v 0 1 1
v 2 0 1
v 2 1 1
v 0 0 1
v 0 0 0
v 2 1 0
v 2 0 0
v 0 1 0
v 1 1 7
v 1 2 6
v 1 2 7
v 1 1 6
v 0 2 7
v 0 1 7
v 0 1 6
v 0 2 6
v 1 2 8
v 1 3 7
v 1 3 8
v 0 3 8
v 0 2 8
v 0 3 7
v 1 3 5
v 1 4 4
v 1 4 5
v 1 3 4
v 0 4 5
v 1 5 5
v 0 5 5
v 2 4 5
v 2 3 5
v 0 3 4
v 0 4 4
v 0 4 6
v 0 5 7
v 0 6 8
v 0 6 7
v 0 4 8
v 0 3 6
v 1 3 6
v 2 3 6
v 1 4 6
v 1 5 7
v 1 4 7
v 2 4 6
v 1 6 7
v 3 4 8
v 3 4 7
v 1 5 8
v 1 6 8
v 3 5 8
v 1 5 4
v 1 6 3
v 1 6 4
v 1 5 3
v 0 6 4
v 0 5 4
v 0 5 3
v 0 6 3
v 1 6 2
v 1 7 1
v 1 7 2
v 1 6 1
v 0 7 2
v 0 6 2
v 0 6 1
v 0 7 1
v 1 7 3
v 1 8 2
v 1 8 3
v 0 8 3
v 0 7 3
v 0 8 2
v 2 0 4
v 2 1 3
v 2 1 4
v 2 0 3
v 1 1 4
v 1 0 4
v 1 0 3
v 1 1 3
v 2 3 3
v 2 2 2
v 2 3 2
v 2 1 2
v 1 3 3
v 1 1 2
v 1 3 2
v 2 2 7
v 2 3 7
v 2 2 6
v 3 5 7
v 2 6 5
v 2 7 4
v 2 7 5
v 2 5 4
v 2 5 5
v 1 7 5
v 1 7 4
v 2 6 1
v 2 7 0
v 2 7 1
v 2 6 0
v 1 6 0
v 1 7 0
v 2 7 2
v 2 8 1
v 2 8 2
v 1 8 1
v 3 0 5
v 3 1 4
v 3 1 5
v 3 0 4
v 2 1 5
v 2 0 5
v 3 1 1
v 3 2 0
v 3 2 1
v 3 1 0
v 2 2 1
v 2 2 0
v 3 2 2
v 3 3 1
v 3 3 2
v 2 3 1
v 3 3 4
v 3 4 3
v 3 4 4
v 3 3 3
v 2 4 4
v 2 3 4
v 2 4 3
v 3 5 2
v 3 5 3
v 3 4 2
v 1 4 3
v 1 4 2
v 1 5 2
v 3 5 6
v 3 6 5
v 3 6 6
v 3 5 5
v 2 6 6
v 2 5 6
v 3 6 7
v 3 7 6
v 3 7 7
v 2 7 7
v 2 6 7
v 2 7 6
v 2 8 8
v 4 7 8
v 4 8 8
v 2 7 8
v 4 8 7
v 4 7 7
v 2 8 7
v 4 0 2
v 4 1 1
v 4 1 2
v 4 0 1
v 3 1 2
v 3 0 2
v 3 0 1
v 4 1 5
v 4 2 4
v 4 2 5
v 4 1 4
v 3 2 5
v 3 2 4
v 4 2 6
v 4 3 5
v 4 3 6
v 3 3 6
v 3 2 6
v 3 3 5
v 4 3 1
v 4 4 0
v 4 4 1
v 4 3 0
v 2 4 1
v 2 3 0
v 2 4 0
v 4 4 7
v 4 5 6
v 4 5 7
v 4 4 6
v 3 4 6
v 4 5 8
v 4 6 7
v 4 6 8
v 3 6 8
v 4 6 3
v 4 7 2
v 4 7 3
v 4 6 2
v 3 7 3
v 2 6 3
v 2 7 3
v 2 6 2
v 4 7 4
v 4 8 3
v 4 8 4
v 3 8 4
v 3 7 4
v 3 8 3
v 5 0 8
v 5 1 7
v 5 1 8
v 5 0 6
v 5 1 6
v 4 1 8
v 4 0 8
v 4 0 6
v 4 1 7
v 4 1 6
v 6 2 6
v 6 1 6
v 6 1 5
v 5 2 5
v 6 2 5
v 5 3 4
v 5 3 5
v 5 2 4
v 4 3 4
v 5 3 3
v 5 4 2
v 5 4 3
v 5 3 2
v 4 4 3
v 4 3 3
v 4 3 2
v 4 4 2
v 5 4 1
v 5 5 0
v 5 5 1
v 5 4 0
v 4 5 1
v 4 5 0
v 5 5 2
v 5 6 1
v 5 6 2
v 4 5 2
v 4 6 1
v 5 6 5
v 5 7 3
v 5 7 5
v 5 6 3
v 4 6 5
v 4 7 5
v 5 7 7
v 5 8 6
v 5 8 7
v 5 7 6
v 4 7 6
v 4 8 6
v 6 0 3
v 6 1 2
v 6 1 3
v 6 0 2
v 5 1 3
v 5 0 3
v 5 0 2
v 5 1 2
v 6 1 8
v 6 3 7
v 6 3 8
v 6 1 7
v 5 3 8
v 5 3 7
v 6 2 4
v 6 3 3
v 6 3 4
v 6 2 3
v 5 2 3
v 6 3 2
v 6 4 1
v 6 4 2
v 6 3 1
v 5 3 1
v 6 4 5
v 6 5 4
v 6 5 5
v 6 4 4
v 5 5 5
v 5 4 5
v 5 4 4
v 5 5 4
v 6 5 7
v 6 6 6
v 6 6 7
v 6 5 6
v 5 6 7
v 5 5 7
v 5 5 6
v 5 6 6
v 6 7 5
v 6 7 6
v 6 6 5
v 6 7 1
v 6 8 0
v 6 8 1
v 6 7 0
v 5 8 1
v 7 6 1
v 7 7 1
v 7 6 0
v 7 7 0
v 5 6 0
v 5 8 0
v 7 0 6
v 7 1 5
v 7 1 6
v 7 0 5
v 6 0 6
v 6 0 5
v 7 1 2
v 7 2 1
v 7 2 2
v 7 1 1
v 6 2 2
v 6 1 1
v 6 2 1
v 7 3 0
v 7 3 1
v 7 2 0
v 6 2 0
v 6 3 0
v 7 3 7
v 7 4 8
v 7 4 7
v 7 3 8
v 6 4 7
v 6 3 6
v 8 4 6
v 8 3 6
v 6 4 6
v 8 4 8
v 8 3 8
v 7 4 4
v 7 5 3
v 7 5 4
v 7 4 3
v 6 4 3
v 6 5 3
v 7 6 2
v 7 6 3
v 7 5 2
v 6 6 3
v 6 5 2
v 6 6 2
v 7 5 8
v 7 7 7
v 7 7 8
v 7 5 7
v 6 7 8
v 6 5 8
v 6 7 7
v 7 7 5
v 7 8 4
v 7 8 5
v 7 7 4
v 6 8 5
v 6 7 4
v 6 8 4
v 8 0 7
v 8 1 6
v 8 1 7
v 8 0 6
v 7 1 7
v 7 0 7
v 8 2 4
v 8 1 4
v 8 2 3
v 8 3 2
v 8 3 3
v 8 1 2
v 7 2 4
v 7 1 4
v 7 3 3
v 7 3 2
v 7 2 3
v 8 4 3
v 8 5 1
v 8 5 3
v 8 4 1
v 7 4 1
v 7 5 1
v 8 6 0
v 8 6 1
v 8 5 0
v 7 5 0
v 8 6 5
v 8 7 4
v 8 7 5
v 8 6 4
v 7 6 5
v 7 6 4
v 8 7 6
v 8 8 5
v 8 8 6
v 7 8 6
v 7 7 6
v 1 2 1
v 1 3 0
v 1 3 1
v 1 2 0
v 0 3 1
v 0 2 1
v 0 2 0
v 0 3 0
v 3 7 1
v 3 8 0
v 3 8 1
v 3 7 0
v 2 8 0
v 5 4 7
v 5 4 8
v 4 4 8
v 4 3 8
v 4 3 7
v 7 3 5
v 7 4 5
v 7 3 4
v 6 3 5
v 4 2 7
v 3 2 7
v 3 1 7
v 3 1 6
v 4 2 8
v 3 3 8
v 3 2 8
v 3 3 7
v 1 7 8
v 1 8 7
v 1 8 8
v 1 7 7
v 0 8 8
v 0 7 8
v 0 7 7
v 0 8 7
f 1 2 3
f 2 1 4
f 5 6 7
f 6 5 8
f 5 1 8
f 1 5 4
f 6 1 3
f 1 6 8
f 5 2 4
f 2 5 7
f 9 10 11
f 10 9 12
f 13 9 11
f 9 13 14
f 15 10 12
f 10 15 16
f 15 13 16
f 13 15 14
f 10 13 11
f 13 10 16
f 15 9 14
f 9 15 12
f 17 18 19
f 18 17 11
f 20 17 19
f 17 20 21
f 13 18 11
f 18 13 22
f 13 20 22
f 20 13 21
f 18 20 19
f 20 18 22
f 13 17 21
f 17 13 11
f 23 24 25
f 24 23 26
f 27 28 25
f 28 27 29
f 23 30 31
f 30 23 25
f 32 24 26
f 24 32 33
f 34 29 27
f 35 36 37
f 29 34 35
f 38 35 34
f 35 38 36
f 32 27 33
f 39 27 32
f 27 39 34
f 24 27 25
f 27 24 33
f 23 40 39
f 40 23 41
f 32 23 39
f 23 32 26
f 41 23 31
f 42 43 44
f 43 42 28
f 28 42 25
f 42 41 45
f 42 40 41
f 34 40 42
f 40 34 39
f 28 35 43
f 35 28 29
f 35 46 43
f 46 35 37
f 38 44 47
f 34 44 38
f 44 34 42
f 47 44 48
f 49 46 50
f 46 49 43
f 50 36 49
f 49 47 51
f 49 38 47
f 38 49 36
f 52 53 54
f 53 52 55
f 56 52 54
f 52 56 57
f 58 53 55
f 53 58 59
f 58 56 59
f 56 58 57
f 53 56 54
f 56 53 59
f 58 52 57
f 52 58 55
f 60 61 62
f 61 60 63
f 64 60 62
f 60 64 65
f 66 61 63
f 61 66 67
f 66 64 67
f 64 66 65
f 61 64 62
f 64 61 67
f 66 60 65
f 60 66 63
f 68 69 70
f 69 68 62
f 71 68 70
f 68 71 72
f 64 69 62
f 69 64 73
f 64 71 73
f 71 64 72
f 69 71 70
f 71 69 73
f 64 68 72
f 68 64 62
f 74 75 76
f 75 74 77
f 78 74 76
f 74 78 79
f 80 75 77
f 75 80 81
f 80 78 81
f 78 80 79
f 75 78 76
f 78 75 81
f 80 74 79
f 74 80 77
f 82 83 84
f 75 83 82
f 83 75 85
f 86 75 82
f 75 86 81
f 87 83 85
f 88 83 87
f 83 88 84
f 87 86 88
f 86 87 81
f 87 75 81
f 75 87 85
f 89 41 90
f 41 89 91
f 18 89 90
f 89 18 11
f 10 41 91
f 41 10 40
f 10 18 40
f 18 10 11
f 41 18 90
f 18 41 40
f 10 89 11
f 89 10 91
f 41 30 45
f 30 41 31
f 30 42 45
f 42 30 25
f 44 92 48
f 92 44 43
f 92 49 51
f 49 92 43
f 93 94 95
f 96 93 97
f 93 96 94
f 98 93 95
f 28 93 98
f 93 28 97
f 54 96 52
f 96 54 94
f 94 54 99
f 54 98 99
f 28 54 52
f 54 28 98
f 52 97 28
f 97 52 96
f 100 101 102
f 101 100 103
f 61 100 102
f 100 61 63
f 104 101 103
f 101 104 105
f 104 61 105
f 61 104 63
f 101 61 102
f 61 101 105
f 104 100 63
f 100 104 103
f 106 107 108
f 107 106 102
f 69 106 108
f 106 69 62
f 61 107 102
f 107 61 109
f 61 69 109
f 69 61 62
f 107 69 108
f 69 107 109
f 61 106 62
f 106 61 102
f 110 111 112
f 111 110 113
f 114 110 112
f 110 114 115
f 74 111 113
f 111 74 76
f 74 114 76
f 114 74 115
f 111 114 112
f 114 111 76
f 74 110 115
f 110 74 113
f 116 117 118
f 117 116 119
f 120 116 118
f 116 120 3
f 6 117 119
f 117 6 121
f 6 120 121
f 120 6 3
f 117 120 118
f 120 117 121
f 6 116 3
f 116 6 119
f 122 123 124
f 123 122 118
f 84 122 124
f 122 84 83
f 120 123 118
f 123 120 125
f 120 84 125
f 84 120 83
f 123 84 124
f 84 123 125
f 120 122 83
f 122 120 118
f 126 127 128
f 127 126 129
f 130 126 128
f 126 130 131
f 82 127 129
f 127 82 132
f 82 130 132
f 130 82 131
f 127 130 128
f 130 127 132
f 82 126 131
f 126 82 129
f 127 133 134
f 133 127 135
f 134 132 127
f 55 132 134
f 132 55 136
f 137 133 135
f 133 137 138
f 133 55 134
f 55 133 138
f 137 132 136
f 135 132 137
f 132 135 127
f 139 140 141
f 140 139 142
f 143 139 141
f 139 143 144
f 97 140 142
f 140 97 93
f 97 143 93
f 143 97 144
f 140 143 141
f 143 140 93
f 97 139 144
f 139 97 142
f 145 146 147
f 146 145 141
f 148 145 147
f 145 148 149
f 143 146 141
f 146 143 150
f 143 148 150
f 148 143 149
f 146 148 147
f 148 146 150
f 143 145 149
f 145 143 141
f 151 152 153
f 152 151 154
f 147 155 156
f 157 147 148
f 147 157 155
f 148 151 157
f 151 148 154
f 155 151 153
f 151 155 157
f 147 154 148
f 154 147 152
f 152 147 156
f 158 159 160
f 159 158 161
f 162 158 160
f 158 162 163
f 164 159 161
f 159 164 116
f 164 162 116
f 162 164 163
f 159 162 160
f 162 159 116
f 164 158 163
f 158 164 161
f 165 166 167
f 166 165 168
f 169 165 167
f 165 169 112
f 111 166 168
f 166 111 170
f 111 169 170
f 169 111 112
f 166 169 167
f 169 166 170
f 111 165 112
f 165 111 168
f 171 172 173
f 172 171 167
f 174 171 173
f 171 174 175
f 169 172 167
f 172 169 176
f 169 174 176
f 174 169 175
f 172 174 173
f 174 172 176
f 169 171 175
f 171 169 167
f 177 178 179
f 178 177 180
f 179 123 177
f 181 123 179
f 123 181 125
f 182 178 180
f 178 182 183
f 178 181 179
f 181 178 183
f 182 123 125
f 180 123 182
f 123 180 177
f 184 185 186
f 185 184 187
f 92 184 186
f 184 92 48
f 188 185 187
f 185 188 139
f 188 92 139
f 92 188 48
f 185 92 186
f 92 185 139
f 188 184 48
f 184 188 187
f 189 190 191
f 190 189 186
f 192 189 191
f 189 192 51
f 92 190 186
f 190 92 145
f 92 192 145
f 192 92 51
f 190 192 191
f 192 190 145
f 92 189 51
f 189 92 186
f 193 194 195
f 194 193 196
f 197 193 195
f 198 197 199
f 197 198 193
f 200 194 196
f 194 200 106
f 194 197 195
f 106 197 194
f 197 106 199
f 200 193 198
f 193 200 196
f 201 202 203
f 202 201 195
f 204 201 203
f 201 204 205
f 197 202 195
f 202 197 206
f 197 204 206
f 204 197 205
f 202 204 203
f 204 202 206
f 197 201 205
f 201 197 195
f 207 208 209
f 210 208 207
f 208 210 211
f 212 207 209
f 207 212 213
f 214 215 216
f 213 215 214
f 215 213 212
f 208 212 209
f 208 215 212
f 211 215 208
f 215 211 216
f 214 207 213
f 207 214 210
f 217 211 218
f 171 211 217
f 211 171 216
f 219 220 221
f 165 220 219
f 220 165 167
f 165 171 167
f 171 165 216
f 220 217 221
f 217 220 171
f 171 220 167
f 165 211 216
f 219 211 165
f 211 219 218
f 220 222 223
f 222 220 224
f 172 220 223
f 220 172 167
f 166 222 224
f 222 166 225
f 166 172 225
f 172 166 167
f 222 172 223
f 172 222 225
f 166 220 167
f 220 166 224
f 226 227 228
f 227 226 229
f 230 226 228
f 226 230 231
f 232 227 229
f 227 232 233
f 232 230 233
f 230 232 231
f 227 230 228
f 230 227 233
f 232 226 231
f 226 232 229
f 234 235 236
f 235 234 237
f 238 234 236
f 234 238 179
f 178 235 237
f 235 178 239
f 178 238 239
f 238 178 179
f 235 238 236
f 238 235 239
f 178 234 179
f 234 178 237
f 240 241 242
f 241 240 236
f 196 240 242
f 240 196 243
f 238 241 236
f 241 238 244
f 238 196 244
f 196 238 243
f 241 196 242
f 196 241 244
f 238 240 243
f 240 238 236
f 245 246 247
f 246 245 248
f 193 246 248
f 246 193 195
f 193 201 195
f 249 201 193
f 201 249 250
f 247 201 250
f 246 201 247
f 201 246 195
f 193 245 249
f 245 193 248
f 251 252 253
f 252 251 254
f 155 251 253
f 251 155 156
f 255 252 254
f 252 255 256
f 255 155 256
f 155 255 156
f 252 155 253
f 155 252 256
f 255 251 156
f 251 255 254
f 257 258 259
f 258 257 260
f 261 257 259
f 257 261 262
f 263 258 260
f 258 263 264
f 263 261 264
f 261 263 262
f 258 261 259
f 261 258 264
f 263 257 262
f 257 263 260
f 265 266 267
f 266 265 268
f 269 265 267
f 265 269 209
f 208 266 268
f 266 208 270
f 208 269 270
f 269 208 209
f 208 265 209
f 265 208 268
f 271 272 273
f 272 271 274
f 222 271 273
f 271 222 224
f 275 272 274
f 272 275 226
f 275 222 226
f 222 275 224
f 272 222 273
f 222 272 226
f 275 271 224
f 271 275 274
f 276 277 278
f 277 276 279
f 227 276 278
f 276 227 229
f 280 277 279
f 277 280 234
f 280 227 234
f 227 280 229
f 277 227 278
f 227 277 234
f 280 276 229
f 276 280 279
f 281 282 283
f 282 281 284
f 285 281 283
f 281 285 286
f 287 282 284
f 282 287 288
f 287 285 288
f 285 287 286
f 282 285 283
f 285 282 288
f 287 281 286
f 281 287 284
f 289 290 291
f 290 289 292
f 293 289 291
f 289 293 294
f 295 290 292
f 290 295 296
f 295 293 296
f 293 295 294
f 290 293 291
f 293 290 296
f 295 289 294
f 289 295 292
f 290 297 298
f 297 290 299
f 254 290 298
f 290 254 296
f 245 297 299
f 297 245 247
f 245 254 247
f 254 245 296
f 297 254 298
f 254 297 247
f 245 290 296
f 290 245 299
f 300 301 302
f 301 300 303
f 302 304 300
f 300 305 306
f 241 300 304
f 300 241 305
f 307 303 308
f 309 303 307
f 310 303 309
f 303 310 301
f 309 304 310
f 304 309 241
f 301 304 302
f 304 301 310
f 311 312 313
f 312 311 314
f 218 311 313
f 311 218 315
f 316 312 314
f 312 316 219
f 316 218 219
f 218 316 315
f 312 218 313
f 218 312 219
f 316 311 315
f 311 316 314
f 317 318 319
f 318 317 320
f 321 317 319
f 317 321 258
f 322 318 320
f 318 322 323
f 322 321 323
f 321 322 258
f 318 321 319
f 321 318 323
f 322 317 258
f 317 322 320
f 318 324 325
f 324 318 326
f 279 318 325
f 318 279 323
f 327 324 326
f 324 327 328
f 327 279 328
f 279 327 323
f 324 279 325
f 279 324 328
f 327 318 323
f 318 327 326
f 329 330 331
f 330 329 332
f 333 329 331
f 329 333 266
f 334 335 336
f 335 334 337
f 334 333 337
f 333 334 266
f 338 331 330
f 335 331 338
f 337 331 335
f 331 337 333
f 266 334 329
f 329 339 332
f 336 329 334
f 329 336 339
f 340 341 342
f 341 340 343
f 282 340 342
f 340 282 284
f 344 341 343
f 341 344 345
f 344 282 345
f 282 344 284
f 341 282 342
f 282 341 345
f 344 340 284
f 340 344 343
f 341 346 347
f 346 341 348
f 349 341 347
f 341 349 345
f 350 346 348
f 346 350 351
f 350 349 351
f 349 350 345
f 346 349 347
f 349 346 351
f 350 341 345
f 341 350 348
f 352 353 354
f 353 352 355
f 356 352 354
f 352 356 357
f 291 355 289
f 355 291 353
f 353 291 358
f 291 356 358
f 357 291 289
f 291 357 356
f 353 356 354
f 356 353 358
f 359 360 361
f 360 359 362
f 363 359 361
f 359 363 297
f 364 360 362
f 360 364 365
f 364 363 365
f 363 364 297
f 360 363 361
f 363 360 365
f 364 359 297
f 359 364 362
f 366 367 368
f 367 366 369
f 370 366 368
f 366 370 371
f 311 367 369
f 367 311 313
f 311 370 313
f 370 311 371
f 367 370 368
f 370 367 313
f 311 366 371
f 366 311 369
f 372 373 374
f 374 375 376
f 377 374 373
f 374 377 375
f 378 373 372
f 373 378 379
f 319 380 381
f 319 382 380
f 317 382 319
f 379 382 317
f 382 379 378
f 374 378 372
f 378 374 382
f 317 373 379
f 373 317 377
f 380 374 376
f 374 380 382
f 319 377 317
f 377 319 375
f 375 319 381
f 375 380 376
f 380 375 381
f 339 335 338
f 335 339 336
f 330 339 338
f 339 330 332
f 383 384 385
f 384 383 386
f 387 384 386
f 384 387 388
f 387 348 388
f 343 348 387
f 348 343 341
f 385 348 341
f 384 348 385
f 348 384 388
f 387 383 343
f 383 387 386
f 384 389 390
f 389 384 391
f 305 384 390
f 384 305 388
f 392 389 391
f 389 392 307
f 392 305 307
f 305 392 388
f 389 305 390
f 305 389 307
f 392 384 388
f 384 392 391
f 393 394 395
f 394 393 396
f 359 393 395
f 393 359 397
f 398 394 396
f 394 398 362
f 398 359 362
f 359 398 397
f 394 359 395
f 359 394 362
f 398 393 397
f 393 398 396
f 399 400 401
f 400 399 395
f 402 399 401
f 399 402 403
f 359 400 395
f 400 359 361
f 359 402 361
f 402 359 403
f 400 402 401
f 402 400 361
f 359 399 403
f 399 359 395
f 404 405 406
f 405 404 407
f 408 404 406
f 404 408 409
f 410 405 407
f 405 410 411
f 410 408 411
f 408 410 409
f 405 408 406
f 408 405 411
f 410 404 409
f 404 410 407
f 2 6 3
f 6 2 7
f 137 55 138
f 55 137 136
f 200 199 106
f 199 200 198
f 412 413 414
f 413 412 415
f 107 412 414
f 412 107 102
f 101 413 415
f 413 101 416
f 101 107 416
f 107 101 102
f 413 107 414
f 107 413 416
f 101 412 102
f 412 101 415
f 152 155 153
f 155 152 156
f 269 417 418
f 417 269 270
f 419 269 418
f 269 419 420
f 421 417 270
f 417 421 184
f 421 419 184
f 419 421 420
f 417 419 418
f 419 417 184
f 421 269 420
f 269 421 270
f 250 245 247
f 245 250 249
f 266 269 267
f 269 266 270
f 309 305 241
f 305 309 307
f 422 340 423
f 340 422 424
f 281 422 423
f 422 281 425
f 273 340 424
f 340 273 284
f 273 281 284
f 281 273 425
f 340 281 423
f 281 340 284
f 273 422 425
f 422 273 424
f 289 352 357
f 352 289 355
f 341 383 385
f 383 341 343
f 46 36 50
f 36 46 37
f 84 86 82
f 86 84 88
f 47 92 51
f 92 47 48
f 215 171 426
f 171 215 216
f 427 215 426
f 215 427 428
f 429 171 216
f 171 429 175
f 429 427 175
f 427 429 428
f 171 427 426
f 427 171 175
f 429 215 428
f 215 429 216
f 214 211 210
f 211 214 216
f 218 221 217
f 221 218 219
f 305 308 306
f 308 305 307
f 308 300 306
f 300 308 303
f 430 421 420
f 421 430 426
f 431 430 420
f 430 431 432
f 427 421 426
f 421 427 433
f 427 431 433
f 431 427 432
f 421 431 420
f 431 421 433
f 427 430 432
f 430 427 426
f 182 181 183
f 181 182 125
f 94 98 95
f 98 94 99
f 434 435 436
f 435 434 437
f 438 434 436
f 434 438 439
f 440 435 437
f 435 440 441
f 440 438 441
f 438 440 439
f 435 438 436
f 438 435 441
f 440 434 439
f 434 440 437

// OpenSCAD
union() {
    translate([0, 0, 0]) cube([1, 1, 1]);
    translate([0, 1, 6]) cube([1, 1, 1]);
    translate([0, 2, 7]) cube([1, 1, 1]);
    translate([0, 3, 4]) cube([1, 1, 1]);
    translate([0, 3, 5]) cube([1, 1, 1]);
    translate([0, 4, 5]) cube([1, 1, 1]);
    translate([0, 4, 6]) cube([1, 1, 1]);
    translate([0, 4, 7]) cube([1, 1, 1]);
    translate([0, 5, 3]) cube([1, 1, 1]);
    translate([0, 6, 1]) cube([1, 1, 1]);
    translate([0, 7, 2]) cube([1, 1, 1]);
    translate([1, 0, 3]) cube([1, 1, 1]);
    translate([1, 1, 2]) cube([1, 1, 1]);
    translate([1, 2, 6]) cube([1, 1, 1]);
    translate([1, 3, 5]) cube([1, 1, 1]);
    translate([1, 4, 7]) cube([1, 1, 1]);
    translate([1, 5, 4]) cube([1, 1, 1]);
    translate([1, 6, 0]) cube([1, 1, 1]);
    translate([1, 7, 1]) cube([1, 1, 1]);
    translate([2, 0, 4]) cube([1, 1, 1]);
    translate([2, 1, 0]) cube([1, 1, 1]);
    translate([2, 2, 1]) cube([1, 1, 1]);
    translate([2, 3, 3]) cube([1, 1, 1]);
    translate([2, 4, 2]) cube([1, 1, 1]);
    translate([2, 5, 5]) cube([1, 1, 1]);
    translate([2, 6, 6]) cube([1, 1, 1]);
    translate([2, 7, 7]) cube([1, 1, 1]);
    translate([3, 0, 1]) cube([1, 1, 1]);
    translate([3, 1, 4]) cube([1, 1, 1]);
    translate([3, 2, 5]) cube([1, 1, 1]);
    translate([3, 3, 0]) cube([1, 1, 1]);
    translate([3, 4, 6]) cube([1, 1, 1]);
    translate([3, 5, 7]) cube([1, 1, 1]);
    translate([3, 6, 2]) cube([1, 1, 1]);
    translate([3, 7, 3]) cube([1, 1, 1]);
    translate([4, 0, 7]) cube([1, 1, 1]);
    translate([4, 1, 5]) cube([1, 1, 1]);
    translate([4, 2, 4]) cube([1, 1, 1]);
    translate([4, 3, 2]) cube([1, 1, 1]);
    translate([4, 4, 0]) cube([1, 1, 1]);
    translate([4, 5, 1]) cube([1, 1, 1]);
    translate([4, 6, 3]) cube([1, 1, 1]);
    translate([4, 7, 6]) cube([1, 1, 1]);
    translate([5, 0, 2]) cube([1, 1, 1]);
    translate([5, 1, 7]) cube([1, 1, 1]);
    translate([5, 2, 3]) cube([1, 1, 1]);
    translate([5, 3, 1]) cube([1, 1, 1]);
    translate([5, 4, 4]) cube([1, 1, 1]);
    translate([5, 5, 6]) cube([1, 1, 1]);
    translate([5, 6, 5]) cube([1, 1, 1]);
    translate([5, 7, 0]) cube([1, 1, 1]);
    translate([6, 0, 5]) cube([1, 1, 1]);
    translate([6, 1, 1]) cube([1, 1, 1]);
    translate([6, 2, 0]) cube([1, 1, 1]);
    translate([6, 3, 6]) cube([1, 1, 1]);
    translate([6, 4, 3]) cube([1, 1, 1]);
    translate([6, 5, 2]) cube([1, 1, 1]);
    translate([6, 6, 7]) cube([1, 1, 1]);
    translate([6, 7, 4]) cube([1, 1, 1]);
    translate([7, 0, 6]) cube([1, 1, 1]);
    translate([7, 1, 3]) cube([1, 1, 1]);
    translate([7, 2, 2]) cube([1, 1, 1]);
    translate([7, 3, 7]) cube([1, 1, 1]);
    translate([7, 4, 1]) cube([1, 1, 1]);
    translate([7, 5, 0]) cube([1, 1, 1]);
    translate([7, 6, 4]) cube([1, 1, 1]);
    translate([7, 7, 5]) cube([1, 1, 1]);
    translate([0, 2, 0]) cube([1, 1, 1]);
    translate([1, 0, 0]) cube([1, 1, 1]);
    translate([1, 4, 2]) cube([1, 1, 1]);
    translate([2, 6, 2]) cube([1, 1, 1]);
    translate([2, 7, 0]) cube([1, 1, 1]);
    translate([3, 7, 7]) cube([1, 1, 1]);
    translate([4, 3, 7]) cube([1, 1, 1]);
    translate([4, 6, 4]) cube([1, 1, 1]);
    translate([5, 2, 7]) cube([1, 1, 1]);
    translate([5, 6, 0]) cube([1, 1, 1]);
    translate([6, 3, 4]) cube([1, 1, 1]);
    translate([6, 5, 7]) cube([1, 1, 1]);
    translate([7, 1, 2]) cube([1, 1, 1]);
    translate([7, 4, 2]) cube([1, 1, 1]);
    translate([0, 5, 7]) cube([1, 1, 1]);
    translate([1, 2, 2]) cube([1, 1, 1]);
    translate([2, 4, 7]) cube([1, 1, 1]);
    translate([3, 1, 6]) cube([1, 1, 1]);
    translate([4, 0, 6]) cube([1, 1, 1]);
    translate([5, 1, 5]) cube([1, 1, 1]);
    translate([6, 6, 0]) cube([1, 1, 1]);
    translate([7, 3, 6]) cube([1, 1, 1]);
    translate([3, 2, 7]) cube([1, 1, 1]);
    translate([2, 3, 0]) cube([1, 1, 1]);
    translate([1, 6, 4]) cube([1, 1, 1]);
    translate([0, 7, 7]) cube([1, 1, 1]);
}
